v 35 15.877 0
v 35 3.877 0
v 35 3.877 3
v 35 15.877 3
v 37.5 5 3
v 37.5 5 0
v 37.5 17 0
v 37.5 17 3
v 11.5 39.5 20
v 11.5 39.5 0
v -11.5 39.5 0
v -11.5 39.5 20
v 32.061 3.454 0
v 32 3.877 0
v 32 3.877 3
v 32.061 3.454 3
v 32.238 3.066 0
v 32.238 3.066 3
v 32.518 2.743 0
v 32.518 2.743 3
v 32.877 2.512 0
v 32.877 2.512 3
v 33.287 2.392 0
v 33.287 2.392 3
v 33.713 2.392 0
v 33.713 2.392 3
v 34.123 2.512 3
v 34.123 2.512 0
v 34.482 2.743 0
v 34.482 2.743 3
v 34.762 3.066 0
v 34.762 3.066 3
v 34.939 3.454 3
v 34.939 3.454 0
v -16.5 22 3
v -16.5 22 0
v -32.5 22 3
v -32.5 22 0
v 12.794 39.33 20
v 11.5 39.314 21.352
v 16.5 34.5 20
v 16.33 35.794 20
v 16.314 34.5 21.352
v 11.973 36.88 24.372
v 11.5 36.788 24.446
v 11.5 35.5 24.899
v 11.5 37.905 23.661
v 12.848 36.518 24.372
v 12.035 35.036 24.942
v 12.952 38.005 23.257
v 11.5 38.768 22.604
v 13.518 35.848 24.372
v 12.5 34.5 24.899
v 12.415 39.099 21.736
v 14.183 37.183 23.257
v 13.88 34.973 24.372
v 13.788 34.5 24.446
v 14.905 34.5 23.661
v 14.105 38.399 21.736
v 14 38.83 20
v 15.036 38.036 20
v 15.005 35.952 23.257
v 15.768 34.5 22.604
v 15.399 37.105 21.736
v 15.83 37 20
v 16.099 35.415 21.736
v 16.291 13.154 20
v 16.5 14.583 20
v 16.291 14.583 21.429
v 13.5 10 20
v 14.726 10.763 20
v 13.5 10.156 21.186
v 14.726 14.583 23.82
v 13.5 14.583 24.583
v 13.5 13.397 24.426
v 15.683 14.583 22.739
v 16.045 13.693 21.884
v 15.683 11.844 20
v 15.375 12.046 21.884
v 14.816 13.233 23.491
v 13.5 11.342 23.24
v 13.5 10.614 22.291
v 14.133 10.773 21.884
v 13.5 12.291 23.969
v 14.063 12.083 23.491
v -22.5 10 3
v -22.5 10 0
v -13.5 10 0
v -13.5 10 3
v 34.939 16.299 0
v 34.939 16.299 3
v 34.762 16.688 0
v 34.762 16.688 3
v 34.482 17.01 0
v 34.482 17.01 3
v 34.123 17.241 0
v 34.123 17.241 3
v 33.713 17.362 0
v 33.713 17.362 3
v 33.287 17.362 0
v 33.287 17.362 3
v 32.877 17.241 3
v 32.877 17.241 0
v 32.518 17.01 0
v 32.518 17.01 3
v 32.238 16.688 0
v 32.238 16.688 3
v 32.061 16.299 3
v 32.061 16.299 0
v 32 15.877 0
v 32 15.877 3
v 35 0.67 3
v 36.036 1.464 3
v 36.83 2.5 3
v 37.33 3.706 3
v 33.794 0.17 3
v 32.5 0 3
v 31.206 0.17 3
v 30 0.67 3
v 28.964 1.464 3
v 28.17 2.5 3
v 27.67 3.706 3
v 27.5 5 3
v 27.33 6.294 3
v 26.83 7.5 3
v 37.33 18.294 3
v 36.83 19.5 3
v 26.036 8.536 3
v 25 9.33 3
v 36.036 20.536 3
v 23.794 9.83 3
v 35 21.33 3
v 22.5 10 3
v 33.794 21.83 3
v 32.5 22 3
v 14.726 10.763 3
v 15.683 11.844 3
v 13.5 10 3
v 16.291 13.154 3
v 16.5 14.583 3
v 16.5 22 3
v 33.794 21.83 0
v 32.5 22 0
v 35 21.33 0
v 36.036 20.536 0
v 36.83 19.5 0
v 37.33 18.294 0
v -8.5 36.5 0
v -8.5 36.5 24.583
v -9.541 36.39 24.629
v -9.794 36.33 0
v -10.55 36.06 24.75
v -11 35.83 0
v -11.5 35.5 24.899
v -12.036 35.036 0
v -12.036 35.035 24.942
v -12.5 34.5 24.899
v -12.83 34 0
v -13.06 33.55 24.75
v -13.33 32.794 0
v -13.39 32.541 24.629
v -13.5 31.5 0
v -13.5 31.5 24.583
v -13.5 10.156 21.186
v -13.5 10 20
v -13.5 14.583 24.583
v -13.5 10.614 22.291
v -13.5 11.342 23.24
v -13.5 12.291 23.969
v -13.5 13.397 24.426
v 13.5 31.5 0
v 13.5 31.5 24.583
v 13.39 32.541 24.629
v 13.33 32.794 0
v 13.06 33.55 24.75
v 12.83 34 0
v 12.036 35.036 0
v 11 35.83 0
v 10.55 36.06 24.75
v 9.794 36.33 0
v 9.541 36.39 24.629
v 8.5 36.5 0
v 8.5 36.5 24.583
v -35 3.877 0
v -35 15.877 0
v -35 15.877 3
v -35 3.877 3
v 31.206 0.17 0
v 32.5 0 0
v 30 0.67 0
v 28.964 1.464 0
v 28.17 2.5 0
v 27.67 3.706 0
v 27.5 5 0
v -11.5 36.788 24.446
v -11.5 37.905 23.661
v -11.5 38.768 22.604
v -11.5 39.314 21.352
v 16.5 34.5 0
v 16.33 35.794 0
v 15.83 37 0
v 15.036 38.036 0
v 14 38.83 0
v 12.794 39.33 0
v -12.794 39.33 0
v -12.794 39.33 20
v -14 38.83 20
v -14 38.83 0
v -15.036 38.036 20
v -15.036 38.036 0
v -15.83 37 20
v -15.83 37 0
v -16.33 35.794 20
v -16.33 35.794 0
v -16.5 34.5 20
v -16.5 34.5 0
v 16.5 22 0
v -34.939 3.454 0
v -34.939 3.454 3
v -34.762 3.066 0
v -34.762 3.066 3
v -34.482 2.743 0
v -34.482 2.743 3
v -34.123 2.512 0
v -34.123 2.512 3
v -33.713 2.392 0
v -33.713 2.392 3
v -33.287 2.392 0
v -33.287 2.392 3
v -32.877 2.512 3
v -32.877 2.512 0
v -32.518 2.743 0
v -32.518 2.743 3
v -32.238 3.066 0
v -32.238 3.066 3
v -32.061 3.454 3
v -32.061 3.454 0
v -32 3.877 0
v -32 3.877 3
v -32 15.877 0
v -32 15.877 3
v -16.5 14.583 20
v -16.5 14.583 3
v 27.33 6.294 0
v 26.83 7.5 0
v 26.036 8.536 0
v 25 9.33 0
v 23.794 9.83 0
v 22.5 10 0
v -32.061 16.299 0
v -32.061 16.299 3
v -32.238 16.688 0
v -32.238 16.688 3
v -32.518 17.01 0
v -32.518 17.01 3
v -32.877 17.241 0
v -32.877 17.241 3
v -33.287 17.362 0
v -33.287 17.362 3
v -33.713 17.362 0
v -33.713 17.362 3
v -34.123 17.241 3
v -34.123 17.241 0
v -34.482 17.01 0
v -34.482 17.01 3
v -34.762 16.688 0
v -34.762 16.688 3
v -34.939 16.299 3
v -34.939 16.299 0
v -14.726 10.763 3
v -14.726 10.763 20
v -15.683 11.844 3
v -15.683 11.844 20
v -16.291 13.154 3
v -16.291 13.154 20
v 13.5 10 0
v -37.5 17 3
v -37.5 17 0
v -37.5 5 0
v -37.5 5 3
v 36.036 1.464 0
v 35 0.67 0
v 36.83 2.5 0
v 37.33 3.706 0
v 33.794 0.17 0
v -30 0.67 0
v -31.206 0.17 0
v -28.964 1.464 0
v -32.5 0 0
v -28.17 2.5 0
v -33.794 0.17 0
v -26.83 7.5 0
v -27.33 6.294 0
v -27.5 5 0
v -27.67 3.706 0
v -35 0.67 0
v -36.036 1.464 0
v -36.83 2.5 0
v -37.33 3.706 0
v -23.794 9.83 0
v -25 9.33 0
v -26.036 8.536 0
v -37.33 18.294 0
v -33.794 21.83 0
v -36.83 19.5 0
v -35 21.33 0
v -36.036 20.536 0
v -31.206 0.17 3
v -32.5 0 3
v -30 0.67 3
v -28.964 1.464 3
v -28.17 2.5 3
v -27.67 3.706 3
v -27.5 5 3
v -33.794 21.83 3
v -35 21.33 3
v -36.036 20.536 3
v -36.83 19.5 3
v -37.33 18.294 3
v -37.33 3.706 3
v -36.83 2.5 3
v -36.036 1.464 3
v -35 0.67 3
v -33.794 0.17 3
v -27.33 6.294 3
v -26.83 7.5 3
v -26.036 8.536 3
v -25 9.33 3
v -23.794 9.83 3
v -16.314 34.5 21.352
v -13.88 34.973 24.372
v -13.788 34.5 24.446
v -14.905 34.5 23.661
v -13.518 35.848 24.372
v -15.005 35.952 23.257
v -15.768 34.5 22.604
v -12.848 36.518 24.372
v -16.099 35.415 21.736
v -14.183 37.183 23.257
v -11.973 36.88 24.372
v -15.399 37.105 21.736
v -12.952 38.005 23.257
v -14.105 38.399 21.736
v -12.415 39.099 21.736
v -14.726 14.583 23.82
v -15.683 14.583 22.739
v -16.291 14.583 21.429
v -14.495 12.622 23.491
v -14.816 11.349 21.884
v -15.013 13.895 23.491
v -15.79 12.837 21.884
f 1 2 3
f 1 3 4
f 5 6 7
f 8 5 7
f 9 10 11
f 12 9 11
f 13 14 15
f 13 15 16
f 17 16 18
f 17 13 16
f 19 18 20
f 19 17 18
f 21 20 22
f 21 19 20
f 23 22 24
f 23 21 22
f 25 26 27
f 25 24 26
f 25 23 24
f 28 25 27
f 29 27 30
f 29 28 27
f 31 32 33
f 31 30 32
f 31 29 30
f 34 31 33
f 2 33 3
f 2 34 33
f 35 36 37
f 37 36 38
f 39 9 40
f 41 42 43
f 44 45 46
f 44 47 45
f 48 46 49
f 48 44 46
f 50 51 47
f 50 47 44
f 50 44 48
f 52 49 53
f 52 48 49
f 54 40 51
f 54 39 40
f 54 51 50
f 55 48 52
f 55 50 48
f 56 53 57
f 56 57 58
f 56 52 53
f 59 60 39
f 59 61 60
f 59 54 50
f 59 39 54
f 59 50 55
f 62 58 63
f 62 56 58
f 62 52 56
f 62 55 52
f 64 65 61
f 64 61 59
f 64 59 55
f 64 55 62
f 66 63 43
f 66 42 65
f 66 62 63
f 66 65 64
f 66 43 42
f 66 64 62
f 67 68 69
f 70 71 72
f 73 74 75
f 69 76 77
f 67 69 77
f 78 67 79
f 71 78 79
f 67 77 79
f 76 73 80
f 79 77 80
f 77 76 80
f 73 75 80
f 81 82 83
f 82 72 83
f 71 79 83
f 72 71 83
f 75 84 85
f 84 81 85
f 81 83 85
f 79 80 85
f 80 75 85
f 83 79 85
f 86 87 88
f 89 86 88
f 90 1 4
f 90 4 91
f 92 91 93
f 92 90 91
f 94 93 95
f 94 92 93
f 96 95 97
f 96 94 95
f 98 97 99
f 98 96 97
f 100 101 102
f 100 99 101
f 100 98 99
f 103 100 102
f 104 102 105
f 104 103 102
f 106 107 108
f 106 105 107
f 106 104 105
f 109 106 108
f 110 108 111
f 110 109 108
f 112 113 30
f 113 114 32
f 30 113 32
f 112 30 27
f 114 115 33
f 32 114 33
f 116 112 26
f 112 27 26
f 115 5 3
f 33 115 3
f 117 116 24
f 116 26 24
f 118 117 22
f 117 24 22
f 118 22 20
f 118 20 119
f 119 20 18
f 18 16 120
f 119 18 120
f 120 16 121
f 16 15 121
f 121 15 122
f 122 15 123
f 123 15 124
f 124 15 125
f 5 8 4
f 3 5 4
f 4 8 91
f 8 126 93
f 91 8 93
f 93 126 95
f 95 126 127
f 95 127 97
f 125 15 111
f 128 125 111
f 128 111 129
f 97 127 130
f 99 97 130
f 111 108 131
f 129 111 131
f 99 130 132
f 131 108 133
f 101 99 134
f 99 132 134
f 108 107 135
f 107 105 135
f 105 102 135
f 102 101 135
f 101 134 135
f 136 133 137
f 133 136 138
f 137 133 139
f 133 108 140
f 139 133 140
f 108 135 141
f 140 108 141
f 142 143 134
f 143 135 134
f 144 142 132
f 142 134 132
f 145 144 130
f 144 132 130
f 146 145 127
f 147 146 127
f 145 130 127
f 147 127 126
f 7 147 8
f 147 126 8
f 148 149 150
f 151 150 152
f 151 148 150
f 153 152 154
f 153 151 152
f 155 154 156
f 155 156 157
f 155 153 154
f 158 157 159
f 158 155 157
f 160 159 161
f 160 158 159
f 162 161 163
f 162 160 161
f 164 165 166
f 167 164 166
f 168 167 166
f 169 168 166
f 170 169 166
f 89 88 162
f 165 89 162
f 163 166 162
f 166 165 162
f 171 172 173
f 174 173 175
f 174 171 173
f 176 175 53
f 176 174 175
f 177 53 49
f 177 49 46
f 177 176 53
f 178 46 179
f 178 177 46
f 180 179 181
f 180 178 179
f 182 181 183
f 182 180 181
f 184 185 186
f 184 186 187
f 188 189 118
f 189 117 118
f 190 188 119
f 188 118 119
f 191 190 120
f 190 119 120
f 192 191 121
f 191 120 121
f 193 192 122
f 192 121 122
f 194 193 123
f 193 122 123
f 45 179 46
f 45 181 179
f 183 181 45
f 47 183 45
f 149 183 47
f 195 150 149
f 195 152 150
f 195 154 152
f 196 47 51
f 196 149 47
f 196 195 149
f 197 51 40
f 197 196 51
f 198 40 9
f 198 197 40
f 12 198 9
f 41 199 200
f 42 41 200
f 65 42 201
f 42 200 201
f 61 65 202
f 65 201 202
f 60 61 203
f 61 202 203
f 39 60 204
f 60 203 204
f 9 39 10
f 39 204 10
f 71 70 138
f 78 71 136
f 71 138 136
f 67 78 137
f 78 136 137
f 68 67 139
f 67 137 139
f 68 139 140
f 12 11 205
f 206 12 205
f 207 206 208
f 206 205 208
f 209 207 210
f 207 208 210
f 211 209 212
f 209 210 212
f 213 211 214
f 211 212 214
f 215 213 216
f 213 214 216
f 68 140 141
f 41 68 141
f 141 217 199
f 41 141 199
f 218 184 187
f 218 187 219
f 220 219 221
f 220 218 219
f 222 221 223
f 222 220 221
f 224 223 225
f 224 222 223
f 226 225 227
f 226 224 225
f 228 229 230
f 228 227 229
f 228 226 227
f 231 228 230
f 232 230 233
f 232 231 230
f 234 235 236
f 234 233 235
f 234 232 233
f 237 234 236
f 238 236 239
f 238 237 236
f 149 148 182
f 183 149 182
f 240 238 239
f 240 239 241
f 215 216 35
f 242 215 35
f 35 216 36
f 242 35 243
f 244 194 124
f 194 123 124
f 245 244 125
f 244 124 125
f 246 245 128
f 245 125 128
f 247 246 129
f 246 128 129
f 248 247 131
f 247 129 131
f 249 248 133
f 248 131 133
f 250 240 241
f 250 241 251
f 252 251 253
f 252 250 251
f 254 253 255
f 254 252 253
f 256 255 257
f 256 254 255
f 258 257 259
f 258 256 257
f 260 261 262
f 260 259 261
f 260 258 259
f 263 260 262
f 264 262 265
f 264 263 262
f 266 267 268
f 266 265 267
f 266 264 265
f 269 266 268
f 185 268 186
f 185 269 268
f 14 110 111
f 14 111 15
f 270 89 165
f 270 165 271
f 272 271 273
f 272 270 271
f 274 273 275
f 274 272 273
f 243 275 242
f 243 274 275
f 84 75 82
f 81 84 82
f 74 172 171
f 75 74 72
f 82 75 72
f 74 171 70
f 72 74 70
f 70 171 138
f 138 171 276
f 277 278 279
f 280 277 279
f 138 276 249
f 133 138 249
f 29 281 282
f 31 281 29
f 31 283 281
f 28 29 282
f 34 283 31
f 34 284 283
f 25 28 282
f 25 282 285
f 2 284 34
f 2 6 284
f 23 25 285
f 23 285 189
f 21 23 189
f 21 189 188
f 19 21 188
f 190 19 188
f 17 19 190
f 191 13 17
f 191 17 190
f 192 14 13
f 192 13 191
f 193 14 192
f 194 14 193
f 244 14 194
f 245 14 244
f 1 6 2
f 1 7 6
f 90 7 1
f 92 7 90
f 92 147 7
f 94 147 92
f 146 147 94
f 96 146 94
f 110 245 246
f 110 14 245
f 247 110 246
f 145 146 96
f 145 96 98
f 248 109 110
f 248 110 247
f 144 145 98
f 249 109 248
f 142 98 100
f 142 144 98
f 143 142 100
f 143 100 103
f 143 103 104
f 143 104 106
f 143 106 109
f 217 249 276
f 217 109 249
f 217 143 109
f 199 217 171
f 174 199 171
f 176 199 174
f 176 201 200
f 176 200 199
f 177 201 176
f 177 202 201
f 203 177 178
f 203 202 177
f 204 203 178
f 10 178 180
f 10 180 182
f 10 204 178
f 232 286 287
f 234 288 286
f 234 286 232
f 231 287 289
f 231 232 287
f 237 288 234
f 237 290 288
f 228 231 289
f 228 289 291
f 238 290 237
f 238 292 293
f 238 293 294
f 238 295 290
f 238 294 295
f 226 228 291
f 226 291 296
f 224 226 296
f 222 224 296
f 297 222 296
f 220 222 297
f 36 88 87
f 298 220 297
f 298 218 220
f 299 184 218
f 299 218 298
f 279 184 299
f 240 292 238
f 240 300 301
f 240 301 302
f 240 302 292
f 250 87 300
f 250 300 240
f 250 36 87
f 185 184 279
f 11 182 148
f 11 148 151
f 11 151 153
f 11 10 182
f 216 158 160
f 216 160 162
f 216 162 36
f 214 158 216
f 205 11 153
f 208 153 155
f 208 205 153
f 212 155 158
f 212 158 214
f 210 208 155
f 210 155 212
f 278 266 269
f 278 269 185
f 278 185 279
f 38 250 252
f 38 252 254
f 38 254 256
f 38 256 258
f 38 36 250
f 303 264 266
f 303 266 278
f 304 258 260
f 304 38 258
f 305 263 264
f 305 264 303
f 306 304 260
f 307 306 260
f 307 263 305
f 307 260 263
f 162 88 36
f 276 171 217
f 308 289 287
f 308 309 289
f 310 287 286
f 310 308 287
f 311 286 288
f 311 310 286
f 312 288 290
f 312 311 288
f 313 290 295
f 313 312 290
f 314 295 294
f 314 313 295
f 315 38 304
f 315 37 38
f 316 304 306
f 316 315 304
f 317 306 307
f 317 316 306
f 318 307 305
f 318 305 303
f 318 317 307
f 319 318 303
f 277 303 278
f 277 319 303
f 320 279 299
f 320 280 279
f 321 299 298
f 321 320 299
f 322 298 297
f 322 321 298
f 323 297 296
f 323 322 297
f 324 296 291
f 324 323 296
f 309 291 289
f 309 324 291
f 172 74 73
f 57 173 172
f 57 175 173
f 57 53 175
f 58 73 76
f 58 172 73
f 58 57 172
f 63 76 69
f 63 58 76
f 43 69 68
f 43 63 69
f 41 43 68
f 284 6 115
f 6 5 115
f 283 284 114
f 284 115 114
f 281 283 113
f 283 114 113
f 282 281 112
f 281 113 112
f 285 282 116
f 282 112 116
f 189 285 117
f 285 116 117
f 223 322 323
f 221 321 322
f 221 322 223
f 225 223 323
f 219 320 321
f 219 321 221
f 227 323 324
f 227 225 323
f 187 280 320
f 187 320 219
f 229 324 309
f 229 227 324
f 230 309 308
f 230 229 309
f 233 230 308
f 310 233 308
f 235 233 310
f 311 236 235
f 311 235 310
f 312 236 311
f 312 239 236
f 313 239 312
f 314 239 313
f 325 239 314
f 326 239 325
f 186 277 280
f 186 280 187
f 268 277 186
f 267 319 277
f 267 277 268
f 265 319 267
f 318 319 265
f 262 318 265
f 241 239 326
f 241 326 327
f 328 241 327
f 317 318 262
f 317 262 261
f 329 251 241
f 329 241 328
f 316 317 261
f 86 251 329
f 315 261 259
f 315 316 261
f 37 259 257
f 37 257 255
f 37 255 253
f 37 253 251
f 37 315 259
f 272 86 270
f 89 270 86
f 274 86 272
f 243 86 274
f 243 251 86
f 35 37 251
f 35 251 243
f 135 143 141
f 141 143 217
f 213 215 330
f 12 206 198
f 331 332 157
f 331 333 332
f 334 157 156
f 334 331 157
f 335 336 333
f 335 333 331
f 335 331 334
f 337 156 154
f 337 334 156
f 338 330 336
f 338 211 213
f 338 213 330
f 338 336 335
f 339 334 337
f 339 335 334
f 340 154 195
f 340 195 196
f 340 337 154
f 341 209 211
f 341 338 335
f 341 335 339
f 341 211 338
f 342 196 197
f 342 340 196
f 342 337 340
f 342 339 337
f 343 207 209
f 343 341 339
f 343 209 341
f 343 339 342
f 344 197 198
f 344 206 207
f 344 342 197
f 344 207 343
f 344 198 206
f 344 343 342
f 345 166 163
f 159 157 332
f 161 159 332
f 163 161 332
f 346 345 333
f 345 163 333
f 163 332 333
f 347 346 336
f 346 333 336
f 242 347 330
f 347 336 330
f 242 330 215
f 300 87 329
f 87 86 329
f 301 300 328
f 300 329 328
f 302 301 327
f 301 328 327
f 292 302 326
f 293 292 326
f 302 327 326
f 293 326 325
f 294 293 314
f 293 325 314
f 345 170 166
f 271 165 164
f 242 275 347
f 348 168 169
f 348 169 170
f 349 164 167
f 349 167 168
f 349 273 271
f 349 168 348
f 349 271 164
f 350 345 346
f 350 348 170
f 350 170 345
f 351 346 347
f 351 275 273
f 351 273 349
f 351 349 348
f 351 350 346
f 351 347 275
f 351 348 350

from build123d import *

# Parameters (mm, degrees)
F2_DEPTH     = 25
F3_DEPTH     = 3
F4_DEPTH     = 25
F5_R         = 4.99999
F6_T1_DEPTH  = 25
F6_T3_DEPTH  = 25
F6_T5_DEPTH  = 50
F6_T7_DEPTH  = 33.4564392374
F6_T9_DEPTH  = 50
F6_T11_DEPTH = 33.4564392374
F7_T1_DEPTH  = 19.917424305
F7_T3_DEPTH  = 23
F7_T6_ANGLE  = 89.9999999974
F7_T8_ANGLE  = 89.9999999974
F7_T10_ANGLE = 209.6926070845
F7_T12_ANGLE = 209.6926070845


# Not quite as in the source:
# - a fillet or chamfer that OpenCascade refuses, or shapes differently, is made with other operations: its cross-section is extruded or revolved along the edge and cut away or added
# - a fillet or chamfer is up to 0.001 mm smaller than in the source, because OpenCascade refuses the exact size


with BuildPart() as f2:
    # F0 (on Top) → F2 (new body)
    with BuildSketch(Plane.XY):
        Polygon((16.5, 39.5), (0, 39.5), (-16.5, 39.5), (-16.5, 22), (-16.5, 10), (-13.5, 10), (-13.5, 36.5), (0, 36.5), (13.5, 36.5), (13.5, 10), (16.5, 10), (16.5, 22), align=None)
    extrude(amount=F2_DEPTH)

    # F0 (on Top) → F3 (join)
    with BuildSketch(Plane.XY):
        Polygon((-16.5, 10), (-16.5, 22), (-37.5, 22), (-37.5, 0), (-27.5, 0), (-27.5, 10), align=None)
        Polygon((37.5, 22), (16.5, 22), (16.5, 10), (27.5, 10), (27.5, 0), (37.5, 0), align=None)
    extrude(amount=F3_DEPTH)

    # F1 (on Top) → F4 (cut)
    with BuildSketch(Plane.XY):
        with BuildLine():
            Line((35, 3.8767794613), (35, 15.8767794613))
            ThreePointArc((35, 15.8767794613), (33.5, 17.3767794613), (32, 15.8767794613))
            Line((32, 15.8767794613), (32, 3.8767794613))
            ThreePointArc((32, 3.8767794613), (33.5, 2.3767794613), (35, 3.8767794613))
        make_face()
        with BuildLine():
            ThreePointArc((-32, 15.8767794613), (-33.5, 17.3767794613), (-35, 15.8767794613))
            Line((-35, 15.8767794613), (-35, 3.8767794613))
            ThreePointArc((-35, 3.8767794613), (-33.5, 2.3767794613), (-32, 3.8767794613))
            Line((-32, 3.8767794613), (-32, 15.8767794613))
        make_face()
    extrude(amount=F4_DEPTH, mode=Mode.SUBTRACT)

    # F5 (radius 5 in the source; OpenCascade refuses exactly that, so slightly less here)
    f5_edges = [f2.edges().sort_by_distance(p)[0] for p in [
        (-37.5, 0, 1.5),
        (-27.5, 0, 1.5),
        (-37.5, 22, 1.5),
        (37.5, 22, 1.5),
        (37.5, 0, 1.5),
        (27.5, 0, 1.5),
        (27.5, 10, 1.5),
        (-27.5, 10, 1.5),
    ]]
    fillet(f5_edges, radius=F5_R)

    # F6: fillet of radius 5 on 6 edges, made by hand

    # F6_s2 → F6_t1 (join)
    with BuildSketch(Plane.XY):
        with BuildLine():
            ThreePointArc((13.5, 31.5), (12.0355339059, 35.0355339059), (8.5, 36.5))
            Line((8.5, 36.5), (13.5, 36.5))
            Line((13.5, 36.5), (13.5, 31.5))
        make_face()
    extrude(amount=F6_T1_DEPTH)

    # F6_s4 → F6_t3 (join)
    with BuildSketch(Plane.XY):
        with BuildLine():
            ThreePointArc((-8.5, 36.5), (-12.0355339059, 35.0355339059), (-13.5, 31.5))
            Line((-13.5, 31.5), (-13.5, 36.5))
            Line((-13.5, 36.5), (-8.5, 36.5))
        make_face()
    extrude(amount=F6_T3_DEPTH)

    # F6_s6 → F6_t5 (cut)
    with BuildSketch(Plane.XY.offset(-12.5)):
        with BuildLine():
            ThreePointArc((16.5, 34.5), (15.0355339059, 38.0355339059), (11.5, 39.5))
            Line((11.5, 39.5), (16.5, 39.5))
            Line((16.5, 39.5), (16.5, 34.5))
        make_face()
    extrude(amount=F6_T5_DEPTH, mode=Mode.SUBTRACT)

    # F6_s8 → F6_t7 (cut)
    with BuildSketch(Plane.XY.offset(3)):
        with BuildLine():
            ThreePointArc((13.5, 10), (15.6833001327, 11.8439629074), (16.5, 14.582575695))
            Line((16.5, 14.582575695), (16.5, 10))
            Line((16.5, 10), (13.5, 10))
        make_face()
    extrude(amount=F6_T7_DEPTH, mode=Mode.SUBTRACT)

    # F6_s10 → F6_t9 (cut)
    with BuildSketch(Plane.XY.offset(-12.5)):
        with BuildLine():
            ThreePointArc((-11.5, 39.5), (-15.0355339059, 38.0355339059), (-16.5, 34.5))
            Line((-16.5, 34.5), (-16.5, 39.5))
            Line((-16.5, 39.5), (-11.5, 39.5))
        make_face()
    extrude(amount=F6_T9_DEPTH, mode=Mode.SUBTRACT)

    # F6_s12 → F6_t11 (cut)
    with BuildSketch(Plane.XY.offset(3)):
        with BuildLine():
            ThreePointArc((-13.5, 10), (-15.6833001327, 11.8439629074), (-16.5, 14.582575695))
            Line((-16.5, 14.582575695), (-16.5, 10))
            Line((-16.5, 10), (-13.5, 10))
        make_face()
    extrude(amount=F6_T11_DEPTH, mode=Mode.SUBTRACT)

    # F7: fillet of radius 5 on 3 edges, made by hand

    # F7_s2 → F7_t1 (cut)
    with BuildSketch(Plane.XZ.offset(-34.5)):
        with BuildLine():
            ThreePointArc((-11.5, 25), (-15.0355339059, 23.5355339059), (-16.5, 20))
            Line((-16.5, 20), (-16.5, 25))
            Line((-16.5, 25), (-11.5, 25))
        make_face()
        with BuildLine():
            ThreePointArc((11.5, 25), (15.0355339059, 23.5355339059), (16.5, 20))
            Line((16.5, 20), (16.5, 25))
            Line((16.5, 25), (11.5, 25))
        make_face()
    extrude(amount=F7_T1_DEPTH, mode=Mode.SUBTRACT)

    # F7_s4 → F7_t3 (cut)
    with BuildSketch(Plane.YZ.offset(-11.5)):
        with BuildLine():
            ThreePointArc((34.5, 25), (38.0355339059, 23.5355339059), (39.5, 20))
            Line((39.5, 20), (39.5, 25))
            Line((39.5, 25), (34.5, 25))
        make_face()
    extrude(amount=F7_T3_DEPTH, mode=Mode.SUBTRACT)

    # F7_s5 → F7_t6 (revolve, cut)
    with BuildSketch(Plane.YZ.offset(11.4999999999)):
        with BuildLine():
            ThreePointArc((34.5, 25), (38.0355339059, 23.5355339059), (39.5, 20))
            Line((39.5, 20), (39.5, 25))
            Line((39.5, 25), (34.5, 25))
        make_face()
    revolve(axis=Axis((11.4999999999, 34.4999999999, 25), (0, 0, -1)), revolution_arc=F7_T6_ANGLE, mode=Mode.SUBTRACT)

    # F7_s7 → F7_t8 (revolve, cut)
    with BuildSketch(Plane.XZ.offset(-34.4999999999)):
        with BuildLine():
            ThreePointArc((-11.5, 25), (-15.0355339059, 23.5355339059), (-16.5, 20))
            Line((-16.5, 20), (-16.5, 25))
            Line((-16.5, 25), (-11.5, 25))
        make_face()
    revolve(axis=Axis((-11.4999999999, 34.4999999999, 25), (0, 0, -1)), revolution_arc=F7_T8_ANGLE, mode=Mode.SUBTRACT)

    # F7_s9 → F7_t10 (revolve, cut)
    with BuildSketch(Plane.XZ.offset(-14.5825756948)):
        with BuildLine():
            ThreePointArc((16.5, 20), (15.0355339059, 23.5355339059), (11.5, 25))
            Line((11.5, 25), (16.5, 25))
            Line((16.5, 25), (16.5, 20))
        make_face()
    revolve(axis=Axis((11.5000000002, 14.5825756948, 25), (0, 0, -1)), revolution_arc=F7_T10_ANGLE, mode=Mode.SUBTRACT)

    # F7_s11 → F7_t12 (revolve, cut)
    with BuildSketch(Plane(origin=(-9.0966946013, 15.9529859327, 0), x_dir=(0, 0, 1), z_dir=(-0.4953465841, 0.8686954366, 0))):
        with BuildLine():
            ThreePointArc((25, -2.7665684632), (23.5355339059, 0.7689654427), (20, 2.2334315368))
            Line((20, 2.2334315368), (25, 2.2334315368))
            Line((25, 2.2334315368), (25, -2.7665684632))
        make_face()
    revolve(axis=Axis((-11.5000000002, 14.5825756948, 25), (0, 0, -1)), revolution_arc=F7_T12_ANGLE, mode=Mode.SUBTRACT)


solid = f2.part
